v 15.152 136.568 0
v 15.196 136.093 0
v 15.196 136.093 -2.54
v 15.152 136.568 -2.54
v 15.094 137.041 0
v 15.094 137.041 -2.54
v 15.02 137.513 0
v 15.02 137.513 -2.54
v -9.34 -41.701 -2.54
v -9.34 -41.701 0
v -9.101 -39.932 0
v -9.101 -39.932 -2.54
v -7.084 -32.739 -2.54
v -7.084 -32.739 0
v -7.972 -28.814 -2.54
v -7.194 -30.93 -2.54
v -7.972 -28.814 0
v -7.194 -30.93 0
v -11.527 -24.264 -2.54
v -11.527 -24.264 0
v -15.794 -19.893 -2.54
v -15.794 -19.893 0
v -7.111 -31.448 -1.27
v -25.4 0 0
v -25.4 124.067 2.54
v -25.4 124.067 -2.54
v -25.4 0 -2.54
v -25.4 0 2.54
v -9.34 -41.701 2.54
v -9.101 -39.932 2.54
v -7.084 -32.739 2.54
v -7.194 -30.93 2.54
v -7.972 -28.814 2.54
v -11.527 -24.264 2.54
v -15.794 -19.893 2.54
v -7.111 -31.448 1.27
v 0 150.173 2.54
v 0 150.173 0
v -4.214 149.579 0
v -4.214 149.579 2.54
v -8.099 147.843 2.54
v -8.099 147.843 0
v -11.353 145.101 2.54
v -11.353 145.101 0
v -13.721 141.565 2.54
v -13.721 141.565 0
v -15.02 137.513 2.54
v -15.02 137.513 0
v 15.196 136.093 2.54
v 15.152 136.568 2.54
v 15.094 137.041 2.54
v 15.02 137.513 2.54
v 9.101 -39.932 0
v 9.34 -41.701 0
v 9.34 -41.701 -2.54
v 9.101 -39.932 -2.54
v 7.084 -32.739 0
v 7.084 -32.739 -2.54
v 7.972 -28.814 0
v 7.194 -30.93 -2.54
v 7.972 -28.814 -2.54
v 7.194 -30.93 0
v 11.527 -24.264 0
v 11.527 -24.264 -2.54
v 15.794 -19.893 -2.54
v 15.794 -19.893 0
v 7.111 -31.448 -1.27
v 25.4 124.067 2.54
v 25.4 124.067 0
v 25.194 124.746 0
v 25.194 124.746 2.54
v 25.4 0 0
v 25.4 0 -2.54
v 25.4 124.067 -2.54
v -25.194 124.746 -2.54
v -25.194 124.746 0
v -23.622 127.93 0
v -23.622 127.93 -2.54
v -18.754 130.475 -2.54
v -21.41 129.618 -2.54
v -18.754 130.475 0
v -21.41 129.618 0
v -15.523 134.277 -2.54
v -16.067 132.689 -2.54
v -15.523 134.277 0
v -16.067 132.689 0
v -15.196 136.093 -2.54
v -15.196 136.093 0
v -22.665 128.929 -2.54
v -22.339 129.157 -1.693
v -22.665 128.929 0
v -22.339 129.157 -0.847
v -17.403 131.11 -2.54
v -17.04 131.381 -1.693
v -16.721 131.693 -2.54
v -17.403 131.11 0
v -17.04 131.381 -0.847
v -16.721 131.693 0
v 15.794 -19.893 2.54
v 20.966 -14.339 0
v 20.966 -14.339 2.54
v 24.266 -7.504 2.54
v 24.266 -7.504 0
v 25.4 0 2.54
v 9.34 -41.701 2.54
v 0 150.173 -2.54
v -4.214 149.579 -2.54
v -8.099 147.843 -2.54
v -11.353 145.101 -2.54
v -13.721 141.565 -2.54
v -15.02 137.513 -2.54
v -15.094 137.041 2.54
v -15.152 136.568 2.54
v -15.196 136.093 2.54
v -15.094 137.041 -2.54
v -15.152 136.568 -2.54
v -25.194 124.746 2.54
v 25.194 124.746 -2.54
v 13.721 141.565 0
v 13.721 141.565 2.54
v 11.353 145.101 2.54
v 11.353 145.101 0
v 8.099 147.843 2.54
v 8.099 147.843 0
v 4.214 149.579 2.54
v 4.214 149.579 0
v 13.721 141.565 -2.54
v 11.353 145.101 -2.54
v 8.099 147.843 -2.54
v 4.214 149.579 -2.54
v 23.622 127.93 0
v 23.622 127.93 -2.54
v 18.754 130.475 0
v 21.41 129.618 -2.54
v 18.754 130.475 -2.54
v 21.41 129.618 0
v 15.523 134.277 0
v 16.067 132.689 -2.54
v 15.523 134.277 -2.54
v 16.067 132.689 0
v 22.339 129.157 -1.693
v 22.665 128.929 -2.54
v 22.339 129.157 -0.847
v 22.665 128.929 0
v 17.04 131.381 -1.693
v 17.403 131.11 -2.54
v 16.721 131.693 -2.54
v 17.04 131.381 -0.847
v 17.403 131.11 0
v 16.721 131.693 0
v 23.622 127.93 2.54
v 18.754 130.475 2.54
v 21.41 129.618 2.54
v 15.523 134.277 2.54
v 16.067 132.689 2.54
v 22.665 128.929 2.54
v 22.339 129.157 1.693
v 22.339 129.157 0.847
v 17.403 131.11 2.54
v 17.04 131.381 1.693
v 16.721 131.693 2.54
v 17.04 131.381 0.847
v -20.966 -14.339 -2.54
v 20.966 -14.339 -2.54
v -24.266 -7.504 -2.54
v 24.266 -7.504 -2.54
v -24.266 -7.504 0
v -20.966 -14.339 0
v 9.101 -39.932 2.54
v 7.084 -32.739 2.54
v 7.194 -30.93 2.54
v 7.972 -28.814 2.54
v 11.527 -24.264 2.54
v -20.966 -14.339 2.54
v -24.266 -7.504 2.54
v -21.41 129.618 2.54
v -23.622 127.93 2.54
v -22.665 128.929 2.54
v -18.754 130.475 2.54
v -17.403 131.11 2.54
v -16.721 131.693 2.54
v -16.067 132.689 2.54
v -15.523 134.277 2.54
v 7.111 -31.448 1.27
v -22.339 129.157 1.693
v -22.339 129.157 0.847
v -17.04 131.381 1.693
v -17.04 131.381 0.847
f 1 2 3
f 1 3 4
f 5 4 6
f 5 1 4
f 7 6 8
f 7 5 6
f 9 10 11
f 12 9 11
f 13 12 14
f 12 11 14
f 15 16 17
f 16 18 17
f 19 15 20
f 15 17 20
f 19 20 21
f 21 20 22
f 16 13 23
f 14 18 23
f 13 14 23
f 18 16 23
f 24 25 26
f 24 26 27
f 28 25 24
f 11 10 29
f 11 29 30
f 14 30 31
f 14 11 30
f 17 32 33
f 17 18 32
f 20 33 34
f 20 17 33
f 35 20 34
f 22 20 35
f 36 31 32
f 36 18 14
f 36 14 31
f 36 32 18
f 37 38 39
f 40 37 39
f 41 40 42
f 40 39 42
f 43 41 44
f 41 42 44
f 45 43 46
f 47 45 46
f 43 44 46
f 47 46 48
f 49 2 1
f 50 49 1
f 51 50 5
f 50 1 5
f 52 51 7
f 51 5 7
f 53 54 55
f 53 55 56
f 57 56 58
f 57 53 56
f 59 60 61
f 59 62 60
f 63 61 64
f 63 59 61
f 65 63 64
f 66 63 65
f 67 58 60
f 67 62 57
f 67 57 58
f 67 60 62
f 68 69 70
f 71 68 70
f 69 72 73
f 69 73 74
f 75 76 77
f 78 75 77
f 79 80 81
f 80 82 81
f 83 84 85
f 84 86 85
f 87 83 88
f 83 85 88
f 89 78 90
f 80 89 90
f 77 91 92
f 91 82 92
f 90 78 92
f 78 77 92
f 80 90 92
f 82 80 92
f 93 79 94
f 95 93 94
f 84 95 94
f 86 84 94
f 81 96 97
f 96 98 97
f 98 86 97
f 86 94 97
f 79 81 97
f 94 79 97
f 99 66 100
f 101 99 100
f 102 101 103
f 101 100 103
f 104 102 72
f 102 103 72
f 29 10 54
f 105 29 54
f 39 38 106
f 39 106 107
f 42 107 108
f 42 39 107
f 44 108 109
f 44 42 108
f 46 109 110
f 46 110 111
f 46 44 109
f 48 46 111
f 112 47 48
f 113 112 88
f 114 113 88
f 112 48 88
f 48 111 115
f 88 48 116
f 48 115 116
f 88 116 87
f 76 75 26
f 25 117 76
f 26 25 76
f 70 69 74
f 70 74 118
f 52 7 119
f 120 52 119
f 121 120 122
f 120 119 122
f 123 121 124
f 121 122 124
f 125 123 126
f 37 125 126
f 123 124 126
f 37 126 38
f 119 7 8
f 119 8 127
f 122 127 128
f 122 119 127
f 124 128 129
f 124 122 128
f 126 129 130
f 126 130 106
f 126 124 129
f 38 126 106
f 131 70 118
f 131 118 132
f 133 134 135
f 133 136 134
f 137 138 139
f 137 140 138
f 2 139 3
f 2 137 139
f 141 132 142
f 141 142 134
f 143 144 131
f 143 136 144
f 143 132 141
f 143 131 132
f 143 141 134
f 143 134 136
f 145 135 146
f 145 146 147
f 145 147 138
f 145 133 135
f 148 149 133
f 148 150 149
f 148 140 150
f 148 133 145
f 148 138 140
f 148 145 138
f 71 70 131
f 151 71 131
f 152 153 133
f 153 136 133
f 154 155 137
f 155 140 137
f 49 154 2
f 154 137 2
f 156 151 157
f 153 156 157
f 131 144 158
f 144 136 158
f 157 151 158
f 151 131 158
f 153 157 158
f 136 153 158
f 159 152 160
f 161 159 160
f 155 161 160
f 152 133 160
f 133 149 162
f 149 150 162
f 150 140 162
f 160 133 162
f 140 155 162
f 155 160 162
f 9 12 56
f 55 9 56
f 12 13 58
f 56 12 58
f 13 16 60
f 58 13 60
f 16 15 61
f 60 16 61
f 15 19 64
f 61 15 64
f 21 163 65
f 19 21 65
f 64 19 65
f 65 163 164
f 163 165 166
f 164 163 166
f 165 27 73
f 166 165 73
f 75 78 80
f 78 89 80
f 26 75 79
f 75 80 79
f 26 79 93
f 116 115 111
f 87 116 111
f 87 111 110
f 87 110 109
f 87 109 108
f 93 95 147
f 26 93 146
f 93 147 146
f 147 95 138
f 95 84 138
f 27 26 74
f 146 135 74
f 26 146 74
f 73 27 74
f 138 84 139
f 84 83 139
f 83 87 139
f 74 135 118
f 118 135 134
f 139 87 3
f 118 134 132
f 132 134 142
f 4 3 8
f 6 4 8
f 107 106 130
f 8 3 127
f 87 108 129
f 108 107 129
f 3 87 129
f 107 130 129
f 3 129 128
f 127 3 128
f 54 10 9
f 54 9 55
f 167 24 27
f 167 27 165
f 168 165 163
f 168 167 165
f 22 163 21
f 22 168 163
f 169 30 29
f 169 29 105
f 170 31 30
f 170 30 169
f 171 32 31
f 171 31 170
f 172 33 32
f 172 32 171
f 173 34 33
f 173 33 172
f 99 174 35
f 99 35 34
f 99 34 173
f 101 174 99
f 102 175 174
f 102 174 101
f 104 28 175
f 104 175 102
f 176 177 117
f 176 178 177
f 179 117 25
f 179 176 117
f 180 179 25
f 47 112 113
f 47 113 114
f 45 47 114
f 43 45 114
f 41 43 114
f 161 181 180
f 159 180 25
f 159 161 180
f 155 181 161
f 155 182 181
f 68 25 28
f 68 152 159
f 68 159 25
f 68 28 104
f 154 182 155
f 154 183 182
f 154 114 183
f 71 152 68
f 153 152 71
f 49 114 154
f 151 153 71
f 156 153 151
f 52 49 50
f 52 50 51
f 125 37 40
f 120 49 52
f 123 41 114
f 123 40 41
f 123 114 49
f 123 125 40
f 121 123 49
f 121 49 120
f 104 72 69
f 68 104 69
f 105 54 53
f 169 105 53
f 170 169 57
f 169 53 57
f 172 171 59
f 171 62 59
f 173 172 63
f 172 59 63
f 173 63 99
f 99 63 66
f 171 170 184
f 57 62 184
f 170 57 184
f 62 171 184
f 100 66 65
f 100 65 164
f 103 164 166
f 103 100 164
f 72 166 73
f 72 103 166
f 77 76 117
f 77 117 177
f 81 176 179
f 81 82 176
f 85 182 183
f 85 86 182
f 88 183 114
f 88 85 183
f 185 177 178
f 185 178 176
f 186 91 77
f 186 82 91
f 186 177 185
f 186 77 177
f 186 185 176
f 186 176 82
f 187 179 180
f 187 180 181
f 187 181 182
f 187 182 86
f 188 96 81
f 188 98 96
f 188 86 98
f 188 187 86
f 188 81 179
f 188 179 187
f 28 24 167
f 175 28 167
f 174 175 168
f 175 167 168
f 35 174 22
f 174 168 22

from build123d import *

# Parameters (mm, degrees)
F1_DEPTH = 2.54


with BuildPart() as f1:
    # F0 (on Top) → F1 (new body, symmetric)
    with BuildSketch(Plane.XY):
        with BuildLine():
            Line((-25.194235027, 124.7463666154), (-25.4, 124.0666854497))
            ThreePointArc((-25.4, 124.0666854497), (-17.9605122421, 106.1061732076), (0, 98.6666854497))
            Line((0, 98.6666854497), (0, 119.6934565528))
            ThreePointArc((0, 119.6934565528), (-11.178630816, 124.575087324), (-15.1958511108, 136.092641188))
            add(Edge.make_bspline(
                [(-25.194235027, 124.7463666154), (-24.5028815559, 126.4870131084), (-23.0882135498, 130.0477968311), (-16.3602558617, 130.2885305927), (-15.4622003113, 134.157385497), (-15.1958511108, 136.092641188)],
                knots=[0, 0, 0, 0, 0.3170422964, 0.6485651967, 0.9316231837, 0.9316231837, 0.9316231837, 0.9316231837], degree=3))
        make_face()
        with BuildLine():
            ThreePointArc((0, 98.6666854497), (-17.9605122421, 106.1061732076), (-25.4, 124.0666854497))
            Line((-25.4, 124.0666854497), (-25.4, 0))
            ThreePointArc((-25.4, 0), (-17.9605122421, 17.9605122421), (0, 25.4))
            Line((0, 25.4), (0, 98.6666854497))
        make_face()
        with BuildLine():
            Line((0, 119.6934565528), (0, 98.6666854497))
            ThreePointArc((0, 98.6666854497), (17.9605122421, 106.1061732076), (25.4, 124.0666854497))
            Line((25.4, 124.0666854497), (25.194235027, 124.7463666154))
            add(Edge.make_bspline(
                [(25.194235027, 124.7463666154), (24.5028815559, 126.4870131084), (23.0882135498, 130.0477968311), (16.3602558617, 130.2885305927), (15.4622003113, 134.1573854969), (15.1958511108, 136.092641188)],
                knots=[0, 0, 0, 0, 0.3170422964, 0.6485651967, 0.9316231837, 0.9316231837, 0.9316231837, 0.9316231837], degree=3))
            ThreePointArc((15.1958511108, 136.092641188), (15.2289587781, 135.5134690835), (15.24, 134.9334565528))
            ThreePointArc((15.24, 134.9334565528), (10.7763073453, 124.1571492075), (0, 119.6934565528))
        make_face()
        with BuildLine():
            ThreePointArc((25.4, 124.0666854497), (17.9605122421, 106.1061732076), (0, 98.6666854497))
            Line((0, 98.6666854497), (0, 25.4))
            ThreePointArc((0, 25.4), (17.9605122421, 17.9605122421), (25.4, 0))
            Line((25.4, 0), (25.4, 124.0666854497))
        make_face()
        with BuildLine():
            ThreePointArc((0, 25.4), (-17.9605122421, 17.9605122421), (-25.4, 0))
            ThreePointArc((-25.4, 0), (-22.8726734376, -11.0453976758), (-15.7936370223, -19.8927381124))
            ThreePointArc((-15.7936370223, -19.8927381124), (-8.3631468941, -23.9836980891), (0, -25.4))
            Line((0, -25.4), (0, 25.4))
        make_face()
        with BuildLine():
            ThreePointArc((25.4, 0), (17.9605122421, 17.9605122421), (0, 25.4))
            Line((0, 25.4), (0, -25.4))
            ThreePointArc((0, -25.4), (8.3631468941, -23.9836980891), (15.7936370223, -19.8927381124))
            ThreePointArc((15.7936370223, -19.8927381124), (22.8726734376, -11.0453976758), (25.4, 0))
        make_face()
        with BuildLine():
            Line((0, 150.1734565528), (0, 119.6934565528))
            ThreePointArc((0, 119.6934565528), (10.7763073453, 124.1571492075), (15.24, 134.9334565528))
            ThreePointArc((15.24, 134.9334565528), (15.2289587781, 135.5134690835), (15.1958511108, 136.092641188))
            add(Edge.make_bspline(
                [(15.1958511108, 136.092641188), (15.1315105474, 136.5601306387), (15.0757636417, 137.0365700135), (15.0201002889, 137.5130277017)],
                knots=[0.9316231837, 0.9316231837, 0.9316231837, 0.9316231837, 1, 1, 1, 1], degree=3))
            ThreePointArc((15.0201002889, 137.5130277017), (9.8220399024, 146.5861443181), (0, 150.1734565528))
        make_face()
        with BuildLine():
            ThreePointArc((-15.1958511108, 136.092641188), (-11.178630816, 124.575087324), (0, 119.6934565528))
            Line((0, 119.6934565528), (0, 150.1734565528))
            ThreePointArc((0, 150.1734565528), (-9.8220399024, 146.5861443181), (-15.0201002889, 137.5130277017))
            add(Edge.make_bspline(
                [(-15.1958511108, 136.092641188), (-15.1315105474, 136.5601306387), (-15.0757636417, 137.0365700135), (-15.0201002889, 137.5130277017)],
                knots=[0.9316231837, 0.9316231837, 0.9316231837, 0.9316231837, 1, 1, 1, 1], degree=3))
        make_face()
        with BuildLine():
            ThreePointArc((0, -25.4), (-8.3631468941, -23.9836980891), (-15.7936370223, -19.8927381124))
            add(Edge.make_bspline(
                [(-9.3395253643, -41.7014285922), (-9.449781817, -39.0560838147), (-3.4475168097, -30.3308044344), (-12.4864934959, -23.5902248246), (-15.7936370223, -19.8927381124)],
                knots=[0, 0, 0, 0, 0.4600508049, 1, 1, 1, 1], degree=3))
            Line((-9.3395253643, -41.7014285922), (0, -41.7014285922))
            Line((0, -41.7014285922), (0, -25.4))
        make_face()
        with BuildLine():
            ThreePointArc((-15.0201002889, 137.5130277017), (-15.124658813, 136.8048987216), (-15.1958511108, 136.092641188))
            add(Edge.make_bspline(
                [(-15.1958511108, 136.092641188), (-15.1315105474, 136.5601306387), (-15.0757636417, 137.0365700135), (-15.0201002889, 137.5130277017)],
                knots=[0.9316231837, 0.9316231837, 0.9316231837, 0.9316231837, 1, 1, 1, 1], degree=3))
        make_face()
        with BuildLine():
            ThreePointArc((15.7936370223, -19.8927381124), (8.3631468941, -23.9836980891), (0, -25.4))
            Line((0, -25.4), (0, -41.7014285922))
            Line((0, -41.7014285922), (9.3395253643, -41.7014285922))
            add(Edge.make_bspline(
                [(9.3395253643, -41.7014285922), (9.449781817, -39.0560838147), (3.4475168097, -30.3308044344), (12.4864934959, -23.5902248246), (15.7936370223, -19.8927381124)],
                knots=[0, 0, 0, 0, 0.4600508049, 1, 1, 1, 1], degree=3))
        make_face()
        with BuildLine():
            add(Edge.make_bspline(
                [(15.1958511108, 136.092641188), (15.1315105474, 136.5601306387), (15.0757636417, 137.0365700135), (15.0201002889, 137.5130277017)],
                knots=[0.9316231837, 0.9316231837, 0.9316231837, 0.9316231837, 1, 1, 1, 1], degree=3))
            ThreePointArc((15.1958511108, 136.092641188), (15.124658813, 136.8048987216), (15.0201002889, 137.5130277017))
        make_face()
    extrude(amount=F1_DEPTH, both=True)


solid = f1.part
